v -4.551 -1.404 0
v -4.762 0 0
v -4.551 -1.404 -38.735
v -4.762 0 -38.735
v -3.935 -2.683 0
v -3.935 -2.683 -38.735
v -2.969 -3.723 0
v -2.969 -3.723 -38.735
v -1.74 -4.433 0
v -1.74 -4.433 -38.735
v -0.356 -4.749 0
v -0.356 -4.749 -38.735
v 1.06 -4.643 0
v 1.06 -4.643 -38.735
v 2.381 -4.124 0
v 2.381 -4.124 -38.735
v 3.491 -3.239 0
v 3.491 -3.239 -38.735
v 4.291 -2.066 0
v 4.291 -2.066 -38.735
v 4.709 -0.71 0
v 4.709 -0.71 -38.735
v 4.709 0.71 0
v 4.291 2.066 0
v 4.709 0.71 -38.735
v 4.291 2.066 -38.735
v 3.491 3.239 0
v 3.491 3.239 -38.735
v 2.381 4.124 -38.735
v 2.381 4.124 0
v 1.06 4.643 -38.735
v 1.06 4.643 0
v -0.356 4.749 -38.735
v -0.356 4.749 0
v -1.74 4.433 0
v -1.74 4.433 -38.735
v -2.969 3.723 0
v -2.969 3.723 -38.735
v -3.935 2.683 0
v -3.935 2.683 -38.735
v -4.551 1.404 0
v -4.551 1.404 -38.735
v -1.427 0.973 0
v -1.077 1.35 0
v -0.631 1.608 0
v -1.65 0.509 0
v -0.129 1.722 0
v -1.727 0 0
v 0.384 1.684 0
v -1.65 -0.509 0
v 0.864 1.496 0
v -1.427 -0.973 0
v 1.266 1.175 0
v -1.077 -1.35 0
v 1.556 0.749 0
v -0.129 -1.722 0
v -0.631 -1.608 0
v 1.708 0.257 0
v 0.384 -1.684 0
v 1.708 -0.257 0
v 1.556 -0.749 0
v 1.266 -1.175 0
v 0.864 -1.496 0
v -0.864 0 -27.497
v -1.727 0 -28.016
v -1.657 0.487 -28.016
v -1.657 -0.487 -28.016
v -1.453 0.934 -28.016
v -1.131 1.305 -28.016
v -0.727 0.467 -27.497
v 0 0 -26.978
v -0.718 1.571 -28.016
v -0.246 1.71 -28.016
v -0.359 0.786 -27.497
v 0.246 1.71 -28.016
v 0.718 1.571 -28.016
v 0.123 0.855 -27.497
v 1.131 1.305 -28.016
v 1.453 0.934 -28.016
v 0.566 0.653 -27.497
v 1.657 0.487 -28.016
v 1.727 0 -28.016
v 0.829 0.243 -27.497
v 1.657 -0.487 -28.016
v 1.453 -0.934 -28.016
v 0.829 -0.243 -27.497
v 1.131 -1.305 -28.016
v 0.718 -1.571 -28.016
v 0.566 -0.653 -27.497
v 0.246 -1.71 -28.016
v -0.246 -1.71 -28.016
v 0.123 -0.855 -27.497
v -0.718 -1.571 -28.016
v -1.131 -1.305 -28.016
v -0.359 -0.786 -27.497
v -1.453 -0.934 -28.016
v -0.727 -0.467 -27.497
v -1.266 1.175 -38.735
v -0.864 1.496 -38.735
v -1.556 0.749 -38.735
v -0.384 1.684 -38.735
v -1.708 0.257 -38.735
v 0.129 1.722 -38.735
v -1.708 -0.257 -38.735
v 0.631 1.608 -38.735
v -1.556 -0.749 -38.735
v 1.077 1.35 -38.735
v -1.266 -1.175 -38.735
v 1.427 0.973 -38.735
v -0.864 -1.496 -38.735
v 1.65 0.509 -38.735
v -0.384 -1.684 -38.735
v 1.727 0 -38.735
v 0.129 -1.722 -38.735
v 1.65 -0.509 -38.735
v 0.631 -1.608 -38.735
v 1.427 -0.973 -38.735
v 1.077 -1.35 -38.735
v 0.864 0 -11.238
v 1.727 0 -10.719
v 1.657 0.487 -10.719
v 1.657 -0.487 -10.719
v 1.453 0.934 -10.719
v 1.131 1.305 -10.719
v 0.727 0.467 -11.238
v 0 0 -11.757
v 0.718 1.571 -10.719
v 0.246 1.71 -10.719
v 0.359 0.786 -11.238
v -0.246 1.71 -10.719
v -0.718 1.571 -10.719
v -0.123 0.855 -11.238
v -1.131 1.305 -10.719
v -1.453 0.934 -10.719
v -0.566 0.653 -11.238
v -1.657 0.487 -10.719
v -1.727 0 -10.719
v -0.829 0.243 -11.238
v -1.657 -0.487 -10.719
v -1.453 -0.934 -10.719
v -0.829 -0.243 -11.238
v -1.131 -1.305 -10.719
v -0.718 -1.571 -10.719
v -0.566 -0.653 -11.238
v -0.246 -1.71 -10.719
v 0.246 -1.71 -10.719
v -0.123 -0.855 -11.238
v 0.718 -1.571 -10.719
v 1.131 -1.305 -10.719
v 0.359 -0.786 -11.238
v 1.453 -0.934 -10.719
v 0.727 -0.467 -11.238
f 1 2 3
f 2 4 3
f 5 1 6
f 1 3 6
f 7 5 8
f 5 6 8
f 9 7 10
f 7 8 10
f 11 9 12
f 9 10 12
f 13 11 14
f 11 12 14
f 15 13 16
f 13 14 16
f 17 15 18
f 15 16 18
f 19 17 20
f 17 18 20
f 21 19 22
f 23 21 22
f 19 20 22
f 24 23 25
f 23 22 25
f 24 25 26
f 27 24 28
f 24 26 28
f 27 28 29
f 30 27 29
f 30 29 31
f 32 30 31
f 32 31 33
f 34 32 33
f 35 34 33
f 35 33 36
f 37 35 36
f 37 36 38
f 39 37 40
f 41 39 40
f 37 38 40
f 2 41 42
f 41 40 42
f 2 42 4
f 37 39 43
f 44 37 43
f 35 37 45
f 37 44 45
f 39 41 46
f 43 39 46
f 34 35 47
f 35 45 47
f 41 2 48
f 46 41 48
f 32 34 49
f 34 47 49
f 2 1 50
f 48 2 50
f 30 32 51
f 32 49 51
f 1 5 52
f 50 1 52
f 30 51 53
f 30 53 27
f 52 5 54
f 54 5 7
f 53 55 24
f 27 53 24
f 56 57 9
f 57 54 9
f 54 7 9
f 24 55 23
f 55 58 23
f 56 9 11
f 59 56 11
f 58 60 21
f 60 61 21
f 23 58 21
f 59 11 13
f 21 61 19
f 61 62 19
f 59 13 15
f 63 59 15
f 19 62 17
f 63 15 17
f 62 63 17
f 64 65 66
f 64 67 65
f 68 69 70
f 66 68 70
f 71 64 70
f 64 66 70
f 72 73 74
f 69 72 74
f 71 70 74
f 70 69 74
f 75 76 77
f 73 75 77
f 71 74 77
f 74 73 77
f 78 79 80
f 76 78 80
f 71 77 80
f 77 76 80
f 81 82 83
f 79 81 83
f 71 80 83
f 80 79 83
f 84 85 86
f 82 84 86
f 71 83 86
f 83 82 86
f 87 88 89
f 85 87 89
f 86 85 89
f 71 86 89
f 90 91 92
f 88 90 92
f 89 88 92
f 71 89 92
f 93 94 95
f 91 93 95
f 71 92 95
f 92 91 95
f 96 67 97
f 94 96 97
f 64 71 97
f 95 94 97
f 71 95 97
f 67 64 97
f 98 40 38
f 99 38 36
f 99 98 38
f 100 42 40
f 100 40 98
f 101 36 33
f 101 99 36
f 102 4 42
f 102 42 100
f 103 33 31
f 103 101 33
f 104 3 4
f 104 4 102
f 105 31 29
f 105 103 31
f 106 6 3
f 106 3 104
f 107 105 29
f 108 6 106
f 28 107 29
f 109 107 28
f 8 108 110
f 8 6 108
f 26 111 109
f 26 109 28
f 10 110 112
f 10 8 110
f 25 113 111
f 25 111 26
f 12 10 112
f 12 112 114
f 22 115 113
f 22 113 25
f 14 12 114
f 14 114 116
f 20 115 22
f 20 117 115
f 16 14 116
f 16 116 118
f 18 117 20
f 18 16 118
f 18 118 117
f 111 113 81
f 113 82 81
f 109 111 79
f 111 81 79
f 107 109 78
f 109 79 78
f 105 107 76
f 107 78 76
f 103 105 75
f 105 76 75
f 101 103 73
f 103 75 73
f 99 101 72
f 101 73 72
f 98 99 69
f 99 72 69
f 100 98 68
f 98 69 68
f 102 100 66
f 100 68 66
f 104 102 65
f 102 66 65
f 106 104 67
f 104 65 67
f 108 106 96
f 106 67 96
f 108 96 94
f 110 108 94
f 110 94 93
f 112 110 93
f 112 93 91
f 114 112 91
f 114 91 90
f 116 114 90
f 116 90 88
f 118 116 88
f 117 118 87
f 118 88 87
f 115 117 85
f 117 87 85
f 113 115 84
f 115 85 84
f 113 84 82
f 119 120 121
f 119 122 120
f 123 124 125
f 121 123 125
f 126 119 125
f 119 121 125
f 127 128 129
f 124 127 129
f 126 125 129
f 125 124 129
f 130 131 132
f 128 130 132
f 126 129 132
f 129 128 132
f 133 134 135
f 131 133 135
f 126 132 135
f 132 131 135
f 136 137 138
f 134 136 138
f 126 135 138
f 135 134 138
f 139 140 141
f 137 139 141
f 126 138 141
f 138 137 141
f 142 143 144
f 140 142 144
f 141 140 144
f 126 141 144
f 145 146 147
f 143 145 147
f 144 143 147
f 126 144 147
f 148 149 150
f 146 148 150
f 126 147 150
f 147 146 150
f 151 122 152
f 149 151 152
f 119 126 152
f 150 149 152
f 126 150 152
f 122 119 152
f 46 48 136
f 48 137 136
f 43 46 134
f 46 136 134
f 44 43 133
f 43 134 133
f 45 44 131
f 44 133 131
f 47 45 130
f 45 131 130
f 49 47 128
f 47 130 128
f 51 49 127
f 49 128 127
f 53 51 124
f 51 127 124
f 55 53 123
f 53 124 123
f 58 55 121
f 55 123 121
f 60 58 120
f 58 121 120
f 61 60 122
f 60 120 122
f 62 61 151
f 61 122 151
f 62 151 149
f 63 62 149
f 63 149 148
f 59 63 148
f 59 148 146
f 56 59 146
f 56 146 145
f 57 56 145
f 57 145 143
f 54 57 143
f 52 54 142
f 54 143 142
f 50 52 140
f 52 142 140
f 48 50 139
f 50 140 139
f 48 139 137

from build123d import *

# Parameters (mm, degrees)
SKETCH1_W                 = 38.735
SKETCH1_H                 = 4.7625
F_8_32_TAPPED_HOLE1_D     = 3.4544
F_8_32_TAPPED_HOLE1_DEPTH = 10.7188
F_8_32_TAPPED_HOLE1_TIP   = 1.037806461
F_8_32_TAPPED_HOLE2_D     = 3.4544
F_8_32_TAPPED_HOLE2_DEPTH = 10.7188
F_8_32_TAPPED_HOLE2_TIP   = 1.037806461


with BuildPart() as part:
    # Sketch1 → Revolve1 (revolve)
    with BuildSketch(Plane(origin=(0, 0, 0), x_dir=(0, 0, -1), z_dir=(1, 0, 0))):
        with Locations((19.3675, 2.38125)):
            Rectangle(SKETCH1_W, SKETCH1_H)
    revolve(axis=Axis((0, 0, 0), (0, 0, 1)))

    # #8-32 Tapped Hole1
    with Locations(Plane.XY):
        with Locations((0, 0)):
            Hole(F_8_32_TAPPED_HOLE1_D / 2, depth=F_8_32_TAPPED_HOLE1_DEPTH)
            with Locations((0, 0, -(F_8_32_TAPPED_HOLE1_DEPTH + F_8_32_TAPPED_HOLE1_TIP / 2))):  # 118° drill point
                Cone(0, F_8_32_TAPPED_HOLE1_D / 2, F_8_32_TAPPED_HOLE1_TIP, mode=Mode.SUBTRACT)

    # #8-32 Tapped Hole2
    with Locations(Plane(origin=(0, 0, -38.735), x_dir=(-1, 0, 0), z_dir=(0, 0, -1))):
        with Locations((0, 0)):
            Hole(F_8_32_TAPPED_HOLE2_D / 2, depth=F_8_32_TAPPED_HOLE2_DEPTH)
            with Locations((0, 0, -(F_8_32_TAPPED_HOLE2_DEPTH + F_8_32_TAPPED_HOLE2_TIP / 2))):  # 118° drill point
                Cone(0, F_8_32_TAPPED_HOLE2_D / 2, F_8_32_TAPPED_HOLE2_TIP, mode=Mode.SUBTRACT)


solid = part.part
